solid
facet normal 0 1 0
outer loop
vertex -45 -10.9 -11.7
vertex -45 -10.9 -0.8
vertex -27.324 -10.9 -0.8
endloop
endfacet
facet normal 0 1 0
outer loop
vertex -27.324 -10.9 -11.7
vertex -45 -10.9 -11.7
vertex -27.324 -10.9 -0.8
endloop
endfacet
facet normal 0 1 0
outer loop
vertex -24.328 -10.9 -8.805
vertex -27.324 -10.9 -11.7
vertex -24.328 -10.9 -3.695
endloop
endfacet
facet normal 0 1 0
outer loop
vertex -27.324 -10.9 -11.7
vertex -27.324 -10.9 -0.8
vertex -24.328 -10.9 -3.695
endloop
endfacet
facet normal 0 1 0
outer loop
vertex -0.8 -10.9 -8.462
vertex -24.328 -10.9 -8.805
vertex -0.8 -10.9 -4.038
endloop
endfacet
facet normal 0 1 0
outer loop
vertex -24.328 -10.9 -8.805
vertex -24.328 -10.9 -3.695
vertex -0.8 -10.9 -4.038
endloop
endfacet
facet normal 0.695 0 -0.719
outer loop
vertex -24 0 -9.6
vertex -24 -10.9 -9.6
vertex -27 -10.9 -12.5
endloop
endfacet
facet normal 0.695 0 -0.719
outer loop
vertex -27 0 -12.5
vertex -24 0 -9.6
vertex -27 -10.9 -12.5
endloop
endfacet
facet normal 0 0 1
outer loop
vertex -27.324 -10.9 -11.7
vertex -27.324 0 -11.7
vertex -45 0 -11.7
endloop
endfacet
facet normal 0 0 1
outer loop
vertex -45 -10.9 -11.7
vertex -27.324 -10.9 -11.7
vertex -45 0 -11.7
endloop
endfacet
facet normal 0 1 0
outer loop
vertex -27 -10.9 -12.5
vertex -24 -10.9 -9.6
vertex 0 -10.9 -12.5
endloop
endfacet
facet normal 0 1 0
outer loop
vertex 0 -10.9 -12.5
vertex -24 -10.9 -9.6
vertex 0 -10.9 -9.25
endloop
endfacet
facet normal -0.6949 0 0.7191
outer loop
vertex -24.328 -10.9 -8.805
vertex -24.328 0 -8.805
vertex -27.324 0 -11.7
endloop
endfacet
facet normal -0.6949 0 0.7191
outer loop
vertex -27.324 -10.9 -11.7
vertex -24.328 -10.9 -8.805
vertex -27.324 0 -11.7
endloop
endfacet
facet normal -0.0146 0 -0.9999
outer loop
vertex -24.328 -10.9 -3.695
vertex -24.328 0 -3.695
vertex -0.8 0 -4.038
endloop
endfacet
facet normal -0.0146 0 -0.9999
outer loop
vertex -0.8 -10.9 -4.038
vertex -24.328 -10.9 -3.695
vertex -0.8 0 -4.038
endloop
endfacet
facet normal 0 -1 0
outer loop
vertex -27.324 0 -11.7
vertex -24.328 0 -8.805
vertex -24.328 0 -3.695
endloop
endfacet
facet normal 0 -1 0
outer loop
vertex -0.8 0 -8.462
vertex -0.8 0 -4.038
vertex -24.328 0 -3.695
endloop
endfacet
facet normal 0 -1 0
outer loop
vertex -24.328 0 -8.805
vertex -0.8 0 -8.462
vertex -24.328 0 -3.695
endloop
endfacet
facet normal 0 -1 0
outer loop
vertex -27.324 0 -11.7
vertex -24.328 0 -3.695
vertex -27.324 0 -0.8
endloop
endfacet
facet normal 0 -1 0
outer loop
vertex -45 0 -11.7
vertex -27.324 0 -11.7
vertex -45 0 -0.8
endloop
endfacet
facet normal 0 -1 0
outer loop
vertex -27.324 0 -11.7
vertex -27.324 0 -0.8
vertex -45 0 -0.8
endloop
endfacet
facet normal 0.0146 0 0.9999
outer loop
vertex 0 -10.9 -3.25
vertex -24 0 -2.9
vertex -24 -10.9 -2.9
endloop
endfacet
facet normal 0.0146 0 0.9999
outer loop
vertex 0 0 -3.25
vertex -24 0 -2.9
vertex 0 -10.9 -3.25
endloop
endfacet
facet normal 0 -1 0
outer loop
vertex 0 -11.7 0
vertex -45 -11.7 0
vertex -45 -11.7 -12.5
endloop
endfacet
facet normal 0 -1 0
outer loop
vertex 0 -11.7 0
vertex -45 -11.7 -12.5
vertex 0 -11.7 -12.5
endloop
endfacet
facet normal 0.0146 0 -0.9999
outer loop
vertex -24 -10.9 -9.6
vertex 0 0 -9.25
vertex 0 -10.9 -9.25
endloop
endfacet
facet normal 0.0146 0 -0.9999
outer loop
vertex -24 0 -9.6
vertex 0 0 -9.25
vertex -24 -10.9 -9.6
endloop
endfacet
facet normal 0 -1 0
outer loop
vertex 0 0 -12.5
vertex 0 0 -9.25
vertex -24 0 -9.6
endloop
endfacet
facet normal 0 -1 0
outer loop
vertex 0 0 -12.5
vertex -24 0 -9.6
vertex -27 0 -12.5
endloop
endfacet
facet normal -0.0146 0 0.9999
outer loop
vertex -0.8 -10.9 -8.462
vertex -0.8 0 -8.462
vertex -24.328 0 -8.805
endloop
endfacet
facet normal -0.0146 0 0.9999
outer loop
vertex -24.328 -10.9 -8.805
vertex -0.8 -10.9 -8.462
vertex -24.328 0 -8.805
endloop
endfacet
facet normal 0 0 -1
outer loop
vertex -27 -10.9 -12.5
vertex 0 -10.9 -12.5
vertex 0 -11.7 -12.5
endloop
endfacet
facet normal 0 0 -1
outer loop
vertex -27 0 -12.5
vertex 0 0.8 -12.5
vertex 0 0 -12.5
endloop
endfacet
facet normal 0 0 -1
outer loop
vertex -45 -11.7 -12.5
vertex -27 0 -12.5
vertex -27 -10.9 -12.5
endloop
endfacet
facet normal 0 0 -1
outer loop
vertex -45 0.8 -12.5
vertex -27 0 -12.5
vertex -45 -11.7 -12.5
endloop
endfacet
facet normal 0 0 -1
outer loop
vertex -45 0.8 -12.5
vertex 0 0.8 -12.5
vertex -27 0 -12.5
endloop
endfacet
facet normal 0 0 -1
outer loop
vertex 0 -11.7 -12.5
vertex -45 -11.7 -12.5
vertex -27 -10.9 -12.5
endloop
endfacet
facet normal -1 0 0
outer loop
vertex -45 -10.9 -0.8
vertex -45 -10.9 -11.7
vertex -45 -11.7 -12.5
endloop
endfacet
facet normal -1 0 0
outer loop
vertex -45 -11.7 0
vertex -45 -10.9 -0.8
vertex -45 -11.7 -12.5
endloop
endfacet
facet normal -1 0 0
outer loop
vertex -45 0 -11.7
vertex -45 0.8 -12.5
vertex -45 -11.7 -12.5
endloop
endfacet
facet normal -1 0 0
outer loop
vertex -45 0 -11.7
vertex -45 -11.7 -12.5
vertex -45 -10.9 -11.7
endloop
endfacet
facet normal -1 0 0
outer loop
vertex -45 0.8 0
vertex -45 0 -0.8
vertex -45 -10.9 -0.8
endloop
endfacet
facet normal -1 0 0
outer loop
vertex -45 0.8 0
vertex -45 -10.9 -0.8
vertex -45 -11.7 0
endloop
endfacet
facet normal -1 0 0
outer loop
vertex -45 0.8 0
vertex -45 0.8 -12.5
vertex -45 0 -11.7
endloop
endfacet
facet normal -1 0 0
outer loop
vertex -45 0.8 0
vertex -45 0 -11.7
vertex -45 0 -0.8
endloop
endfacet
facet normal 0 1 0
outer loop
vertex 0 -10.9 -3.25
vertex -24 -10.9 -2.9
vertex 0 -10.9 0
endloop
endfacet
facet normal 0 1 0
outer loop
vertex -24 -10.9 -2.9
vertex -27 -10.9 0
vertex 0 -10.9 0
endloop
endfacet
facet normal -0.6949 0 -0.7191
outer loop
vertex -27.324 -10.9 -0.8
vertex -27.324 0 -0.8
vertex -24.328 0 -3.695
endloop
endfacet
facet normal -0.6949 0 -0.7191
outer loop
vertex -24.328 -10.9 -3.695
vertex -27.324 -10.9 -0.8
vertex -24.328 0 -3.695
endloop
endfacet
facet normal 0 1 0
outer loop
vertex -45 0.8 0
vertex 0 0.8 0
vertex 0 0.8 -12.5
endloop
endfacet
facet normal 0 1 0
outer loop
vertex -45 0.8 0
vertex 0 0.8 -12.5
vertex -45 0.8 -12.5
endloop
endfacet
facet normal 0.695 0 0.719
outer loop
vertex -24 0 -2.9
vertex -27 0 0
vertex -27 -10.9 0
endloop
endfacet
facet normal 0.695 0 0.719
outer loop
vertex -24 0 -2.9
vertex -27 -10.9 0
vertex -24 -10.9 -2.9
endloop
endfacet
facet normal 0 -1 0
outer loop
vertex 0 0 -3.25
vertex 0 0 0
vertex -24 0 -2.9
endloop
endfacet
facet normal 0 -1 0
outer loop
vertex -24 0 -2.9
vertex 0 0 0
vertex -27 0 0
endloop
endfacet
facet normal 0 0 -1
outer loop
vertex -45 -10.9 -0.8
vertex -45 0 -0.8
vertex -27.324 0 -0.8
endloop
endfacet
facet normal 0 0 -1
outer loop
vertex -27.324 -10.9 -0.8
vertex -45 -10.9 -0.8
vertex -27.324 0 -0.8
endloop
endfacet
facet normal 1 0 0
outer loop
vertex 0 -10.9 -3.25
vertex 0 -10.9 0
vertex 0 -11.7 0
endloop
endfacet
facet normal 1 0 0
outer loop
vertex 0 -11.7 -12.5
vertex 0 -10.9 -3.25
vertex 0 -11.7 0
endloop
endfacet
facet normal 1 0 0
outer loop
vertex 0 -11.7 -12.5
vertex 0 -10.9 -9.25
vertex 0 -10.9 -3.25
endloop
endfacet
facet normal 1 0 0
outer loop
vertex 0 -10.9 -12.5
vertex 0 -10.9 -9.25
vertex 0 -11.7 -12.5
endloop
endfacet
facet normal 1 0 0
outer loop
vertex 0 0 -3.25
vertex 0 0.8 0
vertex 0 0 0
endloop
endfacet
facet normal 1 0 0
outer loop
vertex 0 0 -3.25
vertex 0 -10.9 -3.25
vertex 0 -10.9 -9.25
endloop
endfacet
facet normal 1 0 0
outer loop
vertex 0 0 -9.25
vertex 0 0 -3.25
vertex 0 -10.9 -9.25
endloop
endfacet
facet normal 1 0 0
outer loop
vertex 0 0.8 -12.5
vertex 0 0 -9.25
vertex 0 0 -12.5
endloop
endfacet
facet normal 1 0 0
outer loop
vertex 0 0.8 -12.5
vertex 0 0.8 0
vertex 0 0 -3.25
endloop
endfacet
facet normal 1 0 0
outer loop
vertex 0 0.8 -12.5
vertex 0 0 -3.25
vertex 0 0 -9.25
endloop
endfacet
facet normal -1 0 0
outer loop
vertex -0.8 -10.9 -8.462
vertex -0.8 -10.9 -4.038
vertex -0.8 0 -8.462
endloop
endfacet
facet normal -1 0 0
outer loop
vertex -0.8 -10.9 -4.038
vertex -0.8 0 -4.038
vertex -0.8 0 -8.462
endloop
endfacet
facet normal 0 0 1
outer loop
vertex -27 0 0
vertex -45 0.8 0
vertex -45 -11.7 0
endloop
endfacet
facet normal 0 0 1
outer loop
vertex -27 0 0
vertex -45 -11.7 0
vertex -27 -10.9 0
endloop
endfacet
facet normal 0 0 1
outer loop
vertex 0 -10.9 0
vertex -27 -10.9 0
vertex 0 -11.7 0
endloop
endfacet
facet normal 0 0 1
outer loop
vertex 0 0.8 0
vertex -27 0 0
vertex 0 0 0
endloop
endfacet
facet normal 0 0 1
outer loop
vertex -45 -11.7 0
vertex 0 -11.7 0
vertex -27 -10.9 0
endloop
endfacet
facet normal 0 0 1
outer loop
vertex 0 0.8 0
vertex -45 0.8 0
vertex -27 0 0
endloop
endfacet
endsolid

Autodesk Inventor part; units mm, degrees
ref_plane "YZ Plane" through (0, 0, 0) normal (1, 0, 0) x (0, 1, 0)
ref_plane "XZ Plane" through (0, 0, 0) normal (0, 1, 0) x (-1, 0, 0)
ref_plane "XY Plane" through (0, 0, 0) normal (0, 0, 1) x (1, 0, 0)
sketch "Sketch1" plane through (0, 0, 0) normal (0, 1, 0) x (-1, 0, 0)
  line L0 (45, 0) -> (0, 0)
  line L1 (0, 0) -> (0, -12.5)
  line L2 (0, -12.5) -> (45, -12.5)
  line L3 (45, -12.5) -> (45, 0)
  dimension "d0" = 45
  dimension "d1" = 12.5
extrude "Extrusion1" add sketch "Sketch1" along normal blind 0.8
sketch "Sketch3" plane through (0, 0, 0) normal (0, -1, 0) x (1, 0, 0)
  line L0 (-45, 0) -> (-27, 0)
  line L1 (-27, 0) -> (-24, -2.9)
  line L2 (-24, -2.9) -> (0, -3.25)
  line L3 (0, 0) -> (0, -12.5) projected
  line L4 (0, -9.25) -> (-24, -9.6)
  line L5 (-24, -9.6) -> (-27, -12.5)
  line L6 (0, -12.5) -> (-45, -12.5) projected
  line L7 (-45, -12.5) -> (-27, -12.5)
  line L8 (0, 0) -> (0, -12.5) projected
  line L9 (-28.7719, -3.1178) -> (-25.8887, -3.1178) construction
  line L10 (-28.7189, -9.8202) -> (-22.671, -9.5806) construction
  line L11 (-45, 0) -> (0, 0) construction
  line L12 (0, -3.25) -> (0, -9.25)
  line L13 (-45, -12.5) -> (-45, 0) projected
  line L14 (-45, 0) -> (-45, -0.8)
  line L15 (-45, -0.8) -> (-27.3235, -0.8)
  line L16 (-27.3235, -0.8) -> (-24.3283, -3.6953)
  line L17 (-24.3283, -3.6953) -> (-0.8, -4.0384)
  line L18 (-0.8, -4.0384) -> (-0.8, -8.4616)
  line L19 (-0.8, -8.4616) -> (-24.3283, -8.8047)
  line L20 (-24.3283, -8.8047) -> (-27.3235, -11.7)
  line L21 (-27.3235, -11.7) -> (-45, -11.7)
  line L22 (-45, -12.5) -> (-45, -11.7)
  dimension "d6" = 18
  dimension "d7" = 6.7
  dimension "d9" = 2.9
  dimension "d10" = 6
  dimension "d12" = 24
  dimension "d13" = 3.25
  dimension "d14" = 0.8
  dimension "d15" = 0.8
  dimension "d16" = 0.8
  dimension "d17" = 0.8
  dimension "d18" = 0.8
  dimension "d19" = 0.8
  dimension "d20" = 0.8
extrude "Extrusion2" add sketch "Sketch3" along normal blind 10.9 contours L0 L1 L2 L3 L4 L5 L6 L13 L21 L20 L19 L18 L17 L16 L15
sketch "Sketch4" plane through (0, -10.9, 0) normal (0, -1, 0) x (1, 0, 0)
  line L0 (0, 0) -> (0, -12.5) projected
  line L1 (-45, 0) -> (0, 0)
  line L2 (0, 0) -> (0, -12.5)
  line L3 (0, -12.5) -> (-45, -12.5)
  line L4 (-45, -12.5) -> (-45, 0)
extrude "Extrusion3" add sketch "Sketch4" along normal blind 0.8
properties part number "Cuvette" material "Polycarbonate, Clear"
